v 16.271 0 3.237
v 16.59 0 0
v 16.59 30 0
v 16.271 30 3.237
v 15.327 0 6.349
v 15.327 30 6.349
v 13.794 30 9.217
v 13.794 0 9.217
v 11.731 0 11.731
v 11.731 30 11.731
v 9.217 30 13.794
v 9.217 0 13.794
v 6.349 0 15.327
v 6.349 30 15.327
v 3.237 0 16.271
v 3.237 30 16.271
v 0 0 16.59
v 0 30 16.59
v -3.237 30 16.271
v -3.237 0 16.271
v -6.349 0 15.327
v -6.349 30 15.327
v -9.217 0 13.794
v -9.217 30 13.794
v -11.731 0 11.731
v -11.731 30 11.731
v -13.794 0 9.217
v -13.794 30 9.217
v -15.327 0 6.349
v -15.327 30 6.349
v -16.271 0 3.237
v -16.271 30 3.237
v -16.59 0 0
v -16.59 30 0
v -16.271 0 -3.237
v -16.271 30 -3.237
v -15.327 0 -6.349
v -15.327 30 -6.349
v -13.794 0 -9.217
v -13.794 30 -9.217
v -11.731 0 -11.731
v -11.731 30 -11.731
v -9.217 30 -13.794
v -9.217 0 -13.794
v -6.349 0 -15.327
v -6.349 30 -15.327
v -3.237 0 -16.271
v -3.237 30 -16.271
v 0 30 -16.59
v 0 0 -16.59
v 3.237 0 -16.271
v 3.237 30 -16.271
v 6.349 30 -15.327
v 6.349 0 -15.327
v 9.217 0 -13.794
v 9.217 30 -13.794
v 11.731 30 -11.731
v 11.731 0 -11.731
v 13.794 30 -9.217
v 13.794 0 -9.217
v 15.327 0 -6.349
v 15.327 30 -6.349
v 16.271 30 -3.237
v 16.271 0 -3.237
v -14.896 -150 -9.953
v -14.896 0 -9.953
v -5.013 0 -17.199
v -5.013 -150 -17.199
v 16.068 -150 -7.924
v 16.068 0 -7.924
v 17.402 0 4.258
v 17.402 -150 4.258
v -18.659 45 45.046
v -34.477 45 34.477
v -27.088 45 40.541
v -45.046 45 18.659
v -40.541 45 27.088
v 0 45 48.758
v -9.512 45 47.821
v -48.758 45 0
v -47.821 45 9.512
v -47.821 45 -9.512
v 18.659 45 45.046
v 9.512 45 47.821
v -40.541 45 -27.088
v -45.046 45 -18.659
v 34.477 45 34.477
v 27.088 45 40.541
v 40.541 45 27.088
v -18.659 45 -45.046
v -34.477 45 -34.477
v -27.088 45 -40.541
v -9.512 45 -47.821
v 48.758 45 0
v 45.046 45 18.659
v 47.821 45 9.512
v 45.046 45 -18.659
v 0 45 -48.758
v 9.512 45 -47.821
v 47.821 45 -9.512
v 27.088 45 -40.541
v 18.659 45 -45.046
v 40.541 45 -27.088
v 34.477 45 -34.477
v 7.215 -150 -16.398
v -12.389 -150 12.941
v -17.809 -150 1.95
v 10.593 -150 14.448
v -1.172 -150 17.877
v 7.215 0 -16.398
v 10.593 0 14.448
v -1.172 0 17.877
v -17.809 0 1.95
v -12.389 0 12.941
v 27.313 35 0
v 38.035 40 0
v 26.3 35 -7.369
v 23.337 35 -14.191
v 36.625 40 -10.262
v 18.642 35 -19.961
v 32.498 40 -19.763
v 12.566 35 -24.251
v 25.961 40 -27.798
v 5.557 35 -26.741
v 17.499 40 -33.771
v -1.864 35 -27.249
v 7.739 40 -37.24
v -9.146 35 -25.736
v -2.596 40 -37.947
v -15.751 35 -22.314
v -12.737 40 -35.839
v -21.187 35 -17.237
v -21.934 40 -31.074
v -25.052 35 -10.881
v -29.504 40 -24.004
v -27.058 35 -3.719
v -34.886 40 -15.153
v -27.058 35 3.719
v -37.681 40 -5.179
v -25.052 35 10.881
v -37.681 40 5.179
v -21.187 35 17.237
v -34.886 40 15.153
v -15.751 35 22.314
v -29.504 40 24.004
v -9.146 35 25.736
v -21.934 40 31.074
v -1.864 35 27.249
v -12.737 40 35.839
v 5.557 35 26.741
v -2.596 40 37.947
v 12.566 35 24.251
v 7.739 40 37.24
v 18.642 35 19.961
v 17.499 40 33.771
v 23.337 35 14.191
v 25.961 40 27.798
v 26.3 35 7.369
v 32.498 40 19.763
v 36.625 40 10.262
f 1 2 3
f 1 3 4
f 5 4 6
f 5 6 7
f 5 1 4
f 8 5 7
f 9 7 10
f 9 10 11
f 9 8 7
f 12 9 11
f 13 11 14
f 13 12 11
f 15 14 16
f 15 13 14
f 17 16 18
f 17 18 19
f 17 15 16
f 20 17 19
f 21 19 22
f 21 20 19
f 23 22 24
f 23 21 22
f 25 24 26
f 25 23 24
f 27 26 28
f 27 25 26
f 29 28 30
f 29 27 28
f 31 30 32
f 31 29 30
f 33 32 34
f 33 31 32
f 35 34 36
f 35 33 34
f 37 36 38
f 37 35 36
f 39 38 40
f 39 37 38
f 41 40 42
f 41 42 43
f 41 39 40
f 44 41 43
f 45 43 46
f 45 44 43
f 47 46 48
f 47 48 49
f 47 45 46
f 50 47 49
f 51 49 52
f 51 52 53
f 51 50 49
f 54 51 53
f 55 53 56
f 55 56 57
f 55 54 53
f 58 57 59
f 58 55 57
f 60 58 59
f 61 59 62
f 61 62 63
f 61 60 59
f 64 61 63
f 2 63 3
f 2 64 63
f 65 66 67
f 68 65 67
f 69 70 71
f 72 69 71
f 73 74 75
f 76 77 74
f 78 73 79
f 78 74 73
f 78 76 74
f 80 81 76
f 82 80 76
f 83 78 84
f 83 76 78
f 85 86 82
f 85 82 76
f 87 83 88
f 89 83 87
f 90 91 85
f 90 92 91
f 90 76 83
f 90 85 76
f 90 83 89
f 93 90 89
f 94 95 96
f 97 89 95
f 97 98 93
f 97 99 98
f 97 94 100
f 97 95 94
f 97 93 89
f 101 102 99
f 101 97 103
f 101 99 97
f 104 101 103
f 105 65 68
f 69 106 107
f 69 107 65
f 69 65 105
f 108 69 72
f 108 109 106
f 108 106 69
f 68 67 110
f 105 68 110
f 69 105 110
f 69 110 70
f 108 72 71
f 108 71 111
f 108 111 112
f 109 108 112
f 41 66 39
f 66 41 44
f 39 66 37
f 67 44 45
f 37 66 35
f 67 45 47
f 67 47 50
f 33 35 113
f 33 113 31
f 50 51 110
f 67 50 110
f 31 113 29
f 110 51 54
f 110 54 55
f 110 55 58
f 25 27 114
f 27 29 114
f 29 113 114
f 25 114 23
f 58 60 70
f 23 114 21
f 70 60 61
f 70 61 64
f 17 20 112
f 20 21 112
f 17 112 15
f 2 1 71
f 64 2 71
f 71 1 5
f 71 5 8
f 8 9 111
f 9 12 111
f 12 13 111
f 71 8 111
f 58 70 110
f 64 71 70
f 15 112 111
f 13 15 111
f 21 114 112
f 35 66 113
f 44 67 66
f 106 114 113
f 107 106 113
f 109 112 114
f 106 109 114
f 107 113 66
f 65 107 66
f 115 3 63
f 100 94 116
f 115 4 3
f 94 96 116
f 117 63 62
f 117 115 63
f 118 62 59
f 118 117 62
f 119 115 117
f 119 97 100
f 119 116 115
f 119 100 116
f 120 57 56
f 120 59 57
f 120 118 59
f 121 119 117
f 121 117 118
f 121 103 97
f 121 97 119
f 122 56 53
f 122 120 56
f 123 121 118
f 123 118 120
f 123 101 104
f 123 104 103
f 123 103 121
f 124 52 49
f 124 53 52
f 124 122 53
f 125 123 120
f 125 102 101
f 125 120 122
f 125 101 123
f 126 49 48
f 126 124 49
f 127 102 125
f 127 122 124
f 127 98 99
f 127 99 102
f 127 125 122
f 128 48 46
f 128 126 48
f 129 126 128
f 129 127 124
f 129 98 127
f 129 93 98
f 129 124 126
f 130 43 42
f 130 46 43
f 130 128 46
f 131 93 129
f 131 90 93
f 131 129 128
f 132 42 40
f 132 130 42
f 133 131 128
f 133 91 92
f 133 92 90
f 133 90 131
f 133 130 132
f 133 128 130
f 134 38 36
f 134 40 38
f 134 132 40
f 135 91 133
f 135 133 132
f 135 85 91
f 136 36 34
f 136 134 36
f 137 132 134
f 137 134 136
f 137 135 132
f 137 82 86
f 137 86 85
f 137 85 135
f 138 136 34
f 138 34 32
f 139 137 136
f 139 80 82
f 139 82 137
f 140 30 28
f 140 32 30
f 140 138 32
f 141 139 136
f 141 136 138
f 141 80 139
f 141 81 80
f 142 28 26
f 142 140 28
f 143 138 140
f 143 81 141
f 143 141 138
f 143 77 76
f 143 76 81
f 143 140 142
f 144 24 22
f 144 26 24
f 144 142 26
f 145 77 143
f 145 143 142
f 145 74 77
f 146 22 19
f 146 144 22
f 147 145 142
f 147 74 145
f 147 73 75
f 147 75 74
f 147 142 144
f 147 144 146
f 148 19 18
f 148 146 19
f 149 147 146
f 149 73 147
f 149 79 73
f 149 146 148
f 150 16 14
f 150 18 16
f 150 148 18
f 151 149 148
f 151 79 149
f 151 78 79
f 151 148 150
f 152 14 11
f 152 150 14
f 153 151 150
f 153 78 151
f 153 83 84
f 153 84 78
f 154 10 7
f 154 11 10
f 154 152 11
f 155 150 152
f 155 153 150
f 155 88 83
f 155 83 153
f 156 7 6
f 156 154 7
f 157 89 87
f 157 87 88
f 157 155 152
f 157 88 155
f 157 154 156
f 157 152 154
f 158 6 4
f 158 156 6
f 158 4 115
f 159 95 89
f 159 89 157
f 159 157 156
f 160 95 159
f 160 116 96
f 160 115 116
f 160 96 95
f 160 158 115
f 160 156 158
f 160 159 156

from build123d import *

# Parameters (mm, degrees)
F1_DEPTH  = 150
F2_R      = 16.5902207369
F3_DEPTH  = 30
F3_FACE_R = 16.5902207369
F4_DEPTH  = 15
F4_TAPER  = -65


with BuildPart() as f1:
    # F0 (on Front) → F1 (new body)
    with BuildSketch(Plane.XZ):
        Polygon((-5.0131896813, -17.1994746155), (7.2152830783, -16.3979781659), (16.0676446966, -7.9236854892), (17.4017767894, 4.2581876898), (10.5934241232, 14.4476075243), (-1.171709423, 17.8768312309), (-12.3885871081, 12.9412869257), (-17.8087072015, 1.9503706416), (-14.8959352736, -9.9531457416), align=None)
    extrude(amount=F1_DEPTH)

    # F2 (on Front) → F3 (join)
    with BuildSketch(Plane.XZ):
        Circle(F2_R)
    extrude(amount=-F3_DEPTH)

    # F3_face (on face) → F4 (join)
    with BuildSketch(Plane(origin=(0, 30, 0), x_dir=(1, 0, 0), z_dir=(0, 1, 0))):
        Circle(F3_FACE_R)
    extrude(amount=F4_DEPTH, taper=F4_TAPER)


solid = f1.part
